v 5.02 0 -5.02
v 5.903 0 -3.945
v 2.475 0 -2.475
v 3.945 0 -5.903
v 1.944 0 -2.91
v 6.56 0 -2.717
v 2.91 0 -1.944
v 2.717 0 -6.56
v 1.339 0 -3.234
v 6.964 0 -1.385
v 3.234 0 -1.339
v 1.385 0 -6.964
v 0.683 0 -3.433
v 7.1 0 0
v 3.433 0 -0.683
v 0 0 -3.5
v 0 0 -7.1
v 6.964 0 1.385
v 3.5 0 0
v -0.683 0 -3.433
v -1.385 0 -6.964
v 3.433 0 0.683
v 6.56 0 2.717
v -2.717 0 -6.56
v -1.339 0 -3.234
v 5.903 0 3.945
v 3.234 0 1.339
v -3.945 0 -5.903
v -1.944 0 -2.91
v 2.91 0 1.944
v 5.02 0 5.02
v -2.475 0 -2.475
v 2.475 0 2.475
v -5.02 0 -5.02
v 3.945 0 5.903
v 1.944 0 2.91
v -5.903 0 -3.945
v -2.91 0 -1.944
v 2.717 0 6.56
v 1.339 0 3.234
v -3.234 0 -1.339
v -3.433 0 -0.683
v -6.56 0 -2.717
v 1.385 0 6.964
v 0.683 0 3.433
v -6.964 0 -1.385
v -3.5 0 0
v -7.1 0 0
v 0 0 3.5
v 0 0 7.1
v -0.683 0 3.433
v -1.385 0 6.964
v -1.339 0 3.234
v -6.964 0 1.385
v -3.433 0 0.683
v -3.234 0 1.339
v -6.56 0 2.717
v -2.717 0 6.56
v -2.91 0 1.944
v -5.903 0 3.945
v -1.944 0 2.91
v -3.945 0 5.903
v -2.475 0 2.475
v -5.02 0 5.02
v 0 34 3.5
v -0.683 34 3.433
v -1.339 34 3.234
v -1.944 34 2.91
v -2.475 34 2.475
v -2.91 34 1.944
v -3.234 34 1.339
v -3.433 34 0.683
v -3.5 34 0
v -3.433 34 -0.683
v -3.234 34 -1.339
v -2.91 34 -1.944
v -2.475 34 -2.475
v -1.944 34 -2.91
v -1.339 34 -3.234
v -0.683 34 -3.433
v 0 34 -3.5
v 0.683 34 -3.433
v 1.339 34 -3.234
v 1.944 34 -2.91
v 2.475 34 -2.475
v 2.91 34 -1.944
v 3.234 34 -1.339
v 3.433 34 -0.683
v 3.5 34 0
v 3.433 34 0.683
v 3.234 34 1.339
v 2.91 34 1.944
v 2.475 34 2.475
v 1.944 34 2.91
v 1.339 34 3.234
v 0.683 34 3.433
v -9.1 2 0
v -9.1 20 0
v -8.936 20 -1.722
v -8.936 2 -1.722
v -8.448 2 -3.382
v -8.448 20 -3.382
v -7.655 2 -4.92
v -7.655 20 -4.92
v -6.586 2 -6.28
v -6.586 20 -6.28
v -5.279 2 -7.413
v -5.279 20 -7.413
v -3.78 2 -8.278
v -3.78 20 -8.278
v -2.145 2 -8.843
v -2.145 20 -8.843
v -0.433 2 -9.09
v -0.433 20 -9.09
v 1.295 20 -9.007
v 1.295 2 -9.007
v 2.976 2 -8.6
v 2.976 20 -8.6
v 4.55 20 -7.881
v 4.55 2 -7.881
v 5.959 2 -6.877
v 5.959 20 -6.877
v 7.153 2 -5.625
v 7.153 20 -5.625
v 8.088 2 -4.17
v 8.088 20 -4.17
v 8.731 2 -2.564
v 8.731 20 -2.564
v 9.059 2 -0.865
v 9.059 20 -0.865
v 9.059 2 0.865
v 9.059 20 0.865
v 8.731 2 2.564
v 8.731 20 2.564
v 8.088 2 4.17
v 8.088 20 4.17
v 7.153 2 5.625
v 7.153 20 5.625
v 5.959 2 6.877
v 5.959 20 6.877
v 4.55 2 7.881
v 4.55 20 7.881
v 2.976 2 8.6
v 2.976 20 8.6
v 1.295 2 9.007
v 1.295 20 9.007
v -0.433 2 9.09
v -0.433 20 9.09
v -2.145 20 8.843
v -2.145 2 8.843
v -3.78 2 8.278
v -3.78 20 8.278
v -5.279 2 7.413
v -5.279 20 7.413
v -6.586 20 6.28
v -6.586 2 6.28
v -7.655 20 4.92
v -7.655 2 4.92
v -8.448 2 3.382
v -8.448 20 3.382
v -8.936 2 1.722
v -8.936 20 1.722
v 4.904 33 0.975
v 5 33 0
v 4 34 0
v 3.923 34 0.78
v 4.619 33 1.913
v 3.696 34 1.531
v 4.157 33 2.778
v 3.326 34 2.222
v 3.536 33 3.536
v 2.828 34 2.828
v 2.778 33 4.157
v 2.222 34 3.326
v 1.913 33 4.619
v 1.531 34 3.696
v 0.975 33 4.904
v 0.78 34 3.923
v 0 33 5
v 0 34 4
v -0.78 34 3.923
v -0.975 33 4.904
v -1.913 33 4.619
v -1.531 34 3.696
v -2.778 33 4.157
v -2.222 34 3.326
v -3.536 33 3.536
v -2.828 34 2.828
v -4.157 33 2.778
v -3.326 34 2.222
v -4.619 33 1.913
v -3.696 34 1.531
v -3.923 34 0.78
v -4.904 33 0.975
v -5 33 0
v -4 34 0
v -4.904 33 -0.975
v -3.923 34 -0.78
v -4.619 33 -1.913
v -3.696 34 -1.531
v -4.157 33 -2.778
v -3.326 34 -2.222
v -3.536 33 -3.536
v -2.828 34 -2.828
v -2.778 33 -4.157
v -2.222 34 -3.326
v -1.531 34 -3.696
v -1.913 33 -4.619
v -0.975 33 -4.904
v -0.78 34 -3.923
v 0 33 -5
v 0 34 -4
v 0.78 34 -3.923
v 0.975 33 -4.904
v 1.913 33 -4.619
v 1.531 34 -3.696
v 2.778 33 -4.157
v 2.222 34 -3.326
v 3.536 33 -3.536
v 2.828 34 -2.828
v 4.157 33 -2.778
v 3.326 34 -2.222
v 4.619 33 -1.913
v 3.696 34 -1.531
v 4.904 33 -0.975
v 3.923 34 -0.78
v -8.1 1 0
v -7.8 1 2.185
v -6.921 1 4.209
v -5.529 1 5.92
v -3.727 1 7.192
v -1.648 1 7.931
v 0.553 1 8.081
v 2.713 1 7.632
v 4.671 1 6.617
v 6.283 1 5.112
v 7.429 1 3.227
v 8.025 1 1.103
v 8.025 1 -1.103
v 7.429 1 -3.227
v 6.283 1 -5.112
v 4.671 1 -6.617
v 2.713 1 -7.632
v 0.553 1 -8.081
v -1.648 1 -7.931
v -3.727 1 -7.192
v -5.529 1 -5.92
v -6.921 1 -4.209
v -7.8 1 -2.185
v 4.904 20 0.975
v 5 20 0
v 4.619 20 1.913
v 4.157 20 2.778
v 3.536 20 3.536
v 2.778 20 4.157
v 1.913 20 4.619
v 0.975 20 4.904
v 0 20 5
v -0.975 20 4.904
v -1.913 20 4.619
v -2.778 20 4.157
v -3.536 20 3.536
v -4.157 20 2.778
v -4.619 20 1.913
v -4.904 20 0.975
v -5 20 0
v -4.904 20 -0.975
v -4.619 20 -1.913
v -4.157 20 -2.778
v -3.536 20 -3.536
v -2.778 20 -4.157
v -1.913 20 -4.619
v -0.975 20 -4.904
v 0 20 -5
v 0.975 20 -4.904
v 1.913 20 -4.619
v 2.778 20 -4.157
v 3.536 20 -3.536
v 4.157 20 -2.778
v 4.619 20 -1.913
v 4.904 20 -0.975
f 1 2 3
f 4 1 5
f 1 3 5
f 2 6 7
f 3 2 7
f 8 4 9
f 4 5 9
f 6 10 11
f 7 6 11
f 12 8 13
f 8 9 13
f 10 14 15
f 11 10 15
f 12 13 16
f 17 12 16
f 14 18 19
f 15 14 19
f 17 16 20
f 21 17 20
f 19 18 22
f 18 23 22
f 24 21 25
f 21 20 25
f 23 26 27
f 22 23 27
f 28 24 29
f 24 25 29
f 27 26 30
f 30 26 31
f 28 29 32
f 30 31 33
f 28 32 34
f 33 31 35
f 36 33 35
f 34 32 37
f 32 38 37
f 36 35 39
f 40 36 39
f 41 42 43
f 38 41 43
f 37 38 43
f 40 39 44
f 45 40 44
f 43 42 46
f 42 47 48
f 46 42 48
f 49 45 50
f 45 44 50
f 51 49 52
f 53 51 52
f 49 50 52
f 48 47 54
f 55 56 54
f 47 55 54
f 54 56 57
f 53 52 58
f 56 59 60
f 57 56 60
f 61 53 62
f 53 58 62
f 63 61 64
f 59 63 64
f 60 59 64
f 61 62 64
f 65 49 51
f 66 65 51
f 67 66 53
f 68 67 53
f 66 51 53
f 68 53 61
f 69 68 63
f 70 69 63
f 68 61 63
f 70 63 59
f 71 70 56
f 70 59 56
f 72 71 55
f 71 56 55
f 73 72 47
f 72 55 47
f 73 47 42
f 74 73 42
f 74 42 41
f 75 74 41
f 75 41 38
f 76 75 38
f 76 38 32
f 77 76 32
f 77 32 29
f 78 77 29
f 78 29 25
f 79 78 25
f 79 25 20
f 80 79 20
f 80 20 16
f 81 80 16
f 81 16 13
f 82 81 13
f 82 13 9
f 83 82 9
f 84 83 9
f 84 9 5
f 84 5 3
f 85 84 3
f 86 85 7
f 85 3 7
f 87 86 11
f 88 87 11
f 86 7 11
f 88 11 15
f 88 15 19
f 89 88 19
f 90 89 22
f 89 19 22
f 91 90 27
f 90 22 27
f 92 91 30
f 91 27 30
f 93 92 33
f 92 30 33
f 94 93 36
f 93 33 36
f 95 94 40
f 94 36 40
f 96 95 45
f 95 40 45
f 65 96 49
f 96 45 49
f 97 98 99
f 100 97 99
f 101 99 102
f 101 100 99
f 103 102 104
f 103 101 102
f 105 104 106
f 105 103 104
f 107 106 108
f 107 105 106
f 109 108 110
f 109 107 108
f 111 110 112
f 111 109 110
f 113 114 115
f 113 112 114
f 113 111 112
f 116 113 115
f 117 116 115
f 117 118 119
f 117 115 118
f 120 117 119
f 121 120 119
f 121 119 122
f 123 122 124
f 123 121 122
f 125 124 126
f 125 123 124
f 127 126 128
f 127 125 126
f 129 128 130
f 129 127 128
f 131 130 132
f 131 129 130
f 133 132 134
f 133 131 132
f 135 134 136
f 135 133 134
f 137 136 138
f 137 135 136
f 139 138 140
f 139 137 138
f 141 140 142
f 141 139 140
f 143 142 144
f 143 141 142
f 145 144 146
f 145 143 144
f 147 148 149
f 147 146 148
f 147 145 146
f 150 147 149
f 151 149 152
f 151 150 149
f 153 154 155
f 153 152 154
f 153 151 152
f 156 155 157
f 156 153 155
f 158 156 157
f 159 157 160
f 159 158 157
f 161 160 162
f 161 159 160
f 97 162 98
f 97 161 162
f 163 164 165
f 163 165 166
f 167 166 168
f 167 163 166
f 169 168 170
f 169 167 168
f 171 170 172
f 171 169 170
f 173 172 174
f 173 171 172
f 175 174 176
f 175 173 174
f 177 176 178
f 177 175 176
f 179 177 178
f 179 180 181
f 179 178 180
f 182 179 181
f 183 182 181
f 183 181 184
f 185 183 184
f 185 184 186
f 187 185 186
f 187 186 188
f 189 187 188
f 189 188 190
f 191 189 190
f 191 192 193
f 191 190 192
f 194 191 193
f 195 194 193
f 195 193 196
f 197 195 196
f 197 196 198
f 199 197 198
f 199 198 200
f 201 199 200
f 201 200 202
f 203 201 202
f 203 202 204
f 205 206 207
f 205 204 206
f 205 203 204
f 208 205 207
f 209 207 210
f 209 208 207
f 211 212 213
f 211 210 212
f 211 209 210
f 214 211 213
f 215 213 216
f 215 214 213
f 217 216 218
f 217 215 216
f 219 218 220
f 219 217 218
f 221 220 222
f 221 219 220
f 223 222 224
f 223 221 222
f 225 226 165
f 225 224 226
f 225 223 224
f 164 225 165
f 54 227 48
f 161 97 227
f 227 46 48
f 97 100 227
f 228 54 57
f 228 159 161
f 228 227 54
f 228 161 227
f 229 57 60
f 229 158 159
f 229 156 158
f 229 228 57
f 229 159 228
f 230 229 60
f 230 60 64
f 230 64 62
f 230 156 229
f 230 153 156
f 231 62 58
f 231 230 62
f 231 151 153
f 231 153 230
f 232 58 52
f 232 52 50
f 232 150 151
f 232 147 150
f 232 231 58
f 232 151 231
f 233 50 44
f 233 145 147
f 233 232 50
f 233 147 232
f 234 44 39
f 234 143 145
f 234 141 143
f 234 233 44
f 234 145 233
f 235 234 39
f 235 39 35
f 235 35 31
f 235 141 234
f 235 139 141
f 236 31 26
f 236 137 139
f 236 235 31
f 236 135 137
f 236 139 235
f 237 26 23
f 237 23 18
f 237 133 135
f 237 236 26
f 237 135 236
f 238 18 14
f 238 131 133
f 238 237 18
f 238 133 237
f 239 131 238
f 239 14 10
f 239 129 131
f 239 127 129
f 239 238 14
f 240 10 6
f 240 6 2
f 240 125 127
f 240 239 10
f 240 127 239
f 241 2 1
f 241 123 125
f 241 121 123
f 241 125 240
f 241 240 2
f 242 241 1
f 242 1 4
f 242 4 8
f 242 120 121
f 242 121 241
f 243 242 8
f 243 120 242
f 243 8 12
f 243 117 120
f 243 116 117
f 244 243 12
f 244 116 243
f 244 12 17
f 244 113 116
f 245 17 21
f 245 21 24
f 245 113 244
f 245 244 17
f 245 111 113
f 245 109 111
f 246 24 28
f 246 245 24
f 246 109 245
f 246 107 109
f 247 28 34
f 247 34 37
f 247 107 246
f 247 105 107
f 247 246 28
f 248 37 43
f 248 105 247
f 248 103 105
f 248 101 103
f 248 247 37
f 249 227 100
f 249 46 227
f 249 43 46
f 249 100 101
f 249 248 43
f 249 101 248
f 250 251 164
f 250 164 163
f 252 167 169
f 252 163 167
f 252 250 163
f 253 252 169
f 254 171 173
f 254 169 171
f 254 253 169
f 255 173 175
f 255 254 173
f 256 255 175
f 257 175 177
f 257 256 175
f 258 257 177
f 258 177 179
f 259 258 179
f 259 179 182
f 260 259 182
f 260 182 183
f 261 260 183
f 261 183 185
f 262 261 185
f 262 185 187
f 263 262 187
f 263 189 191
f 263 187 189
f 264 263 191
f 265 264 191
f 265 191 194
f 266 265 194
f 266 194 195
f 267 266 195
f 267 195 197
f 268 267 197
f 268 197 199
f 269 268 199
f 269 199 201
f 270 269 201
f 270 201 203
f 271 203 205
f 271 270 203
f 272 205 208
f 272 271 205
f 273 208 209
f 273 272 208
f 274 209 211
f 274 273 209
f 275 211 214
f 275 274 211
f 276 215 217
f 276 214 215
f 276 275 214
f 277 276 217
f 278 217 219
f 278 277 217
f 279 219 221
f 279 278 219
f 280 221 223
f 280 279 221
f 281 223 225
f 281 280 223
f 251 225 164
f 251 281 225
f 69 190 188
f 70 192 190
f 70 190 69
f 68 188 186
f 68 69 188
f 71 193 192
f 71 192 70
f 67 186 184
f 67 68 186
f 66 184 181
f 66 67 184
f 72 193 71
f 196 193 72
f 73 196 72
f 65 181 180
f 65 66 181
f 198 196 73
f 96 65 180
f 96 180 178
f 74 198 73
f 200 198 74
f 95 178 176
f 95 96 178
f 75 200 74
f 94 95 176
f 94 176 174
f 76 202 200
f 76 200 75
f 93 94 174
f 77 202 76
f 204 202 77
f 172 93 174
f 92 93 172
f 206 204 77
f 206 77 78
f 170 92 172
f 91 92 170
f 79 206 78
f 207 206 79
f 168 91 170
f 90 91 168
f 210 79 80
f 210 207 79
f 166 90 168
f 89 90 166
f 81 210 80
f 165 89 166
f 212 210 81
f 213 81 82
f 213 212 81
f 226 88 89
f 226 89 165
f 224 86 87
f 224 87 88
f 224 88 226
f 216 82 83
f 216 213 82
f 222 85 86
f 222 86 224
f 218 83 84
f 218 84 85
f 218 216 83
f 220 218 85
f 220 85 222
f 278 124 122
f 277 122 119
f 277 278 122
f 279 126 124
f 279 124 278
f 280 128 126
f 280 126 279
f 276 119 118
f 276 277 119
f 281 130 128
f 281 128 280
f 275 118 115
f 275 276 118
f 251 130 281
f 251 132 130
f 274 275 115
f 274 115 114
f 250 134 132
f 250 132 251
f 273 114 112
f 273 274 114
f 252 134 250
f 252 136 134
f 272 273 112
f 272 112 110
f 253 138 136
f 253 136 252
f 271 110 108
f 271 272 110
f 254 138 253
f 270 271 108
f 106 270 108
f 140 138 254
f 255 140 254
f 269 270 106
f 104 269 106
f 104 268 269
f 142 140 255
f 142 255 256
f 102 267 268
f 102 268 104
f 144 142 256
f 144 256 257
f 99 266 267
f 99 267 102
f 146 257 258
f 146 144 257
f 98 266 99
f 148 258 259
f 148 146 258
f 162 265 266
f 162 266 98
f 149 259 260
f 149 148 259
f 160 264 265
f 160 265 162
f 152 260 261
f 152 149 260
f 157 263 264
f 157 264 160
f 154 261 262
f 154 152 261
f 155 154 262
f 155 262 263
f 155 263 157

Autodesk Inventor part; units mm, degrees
ref_plane "YZ Plane" through (0, 0, 0) normal (1, 0, 0) x (0, 1, 0)
ref_plane "XZ Plane" through (0, 0, 0) normal (0, 1, 0) x (-1, 0, 0)
ref_plane "XY Plane" through (0, 0, 0) normal (0, 0, 1) x (1, 0, 0)
sketch "Boceto1" plane through (0, 0, 0) normal (0, 1, 0) x (-1, 0, 0)
  circle A0 centre (0, 0) radius 9.1
  dimension "d0" = 18.2
extrude "Extrusión1" add sketch "Boceto1" along normal blind 20
sketch "Boceto2" plane through (0, 20, 0) normal (0, 1, 0) x (1, 0, 0)
  circle A0 centre (0, 0) radius 5
  dimension "d3" = 10
extrude "Extrusión2" add sketch "Boceto2" along normal blind 14
sketch "Boceto3" plane through (0, 34, 0) normal (0, 1, 0) x (1, 0, 0)
  circle A0 centre (0, 0) radius 5 projected
hole "Agujero1" at (0, 34, 0) direction (0, -1, 0) diameter 7 end through all
chamfer "Chaflán1" distance 2 angle 45 1 edges at (9.1, 0, 0)
chamfer "Chaflán2" distance 1 angle 45 1 edges at (-5, 34, 0)
thread "Rosca1" size "M10x1.5" class "6g" standard "ANSI Metric M Profile" full length
properties part number "Acople E27"
